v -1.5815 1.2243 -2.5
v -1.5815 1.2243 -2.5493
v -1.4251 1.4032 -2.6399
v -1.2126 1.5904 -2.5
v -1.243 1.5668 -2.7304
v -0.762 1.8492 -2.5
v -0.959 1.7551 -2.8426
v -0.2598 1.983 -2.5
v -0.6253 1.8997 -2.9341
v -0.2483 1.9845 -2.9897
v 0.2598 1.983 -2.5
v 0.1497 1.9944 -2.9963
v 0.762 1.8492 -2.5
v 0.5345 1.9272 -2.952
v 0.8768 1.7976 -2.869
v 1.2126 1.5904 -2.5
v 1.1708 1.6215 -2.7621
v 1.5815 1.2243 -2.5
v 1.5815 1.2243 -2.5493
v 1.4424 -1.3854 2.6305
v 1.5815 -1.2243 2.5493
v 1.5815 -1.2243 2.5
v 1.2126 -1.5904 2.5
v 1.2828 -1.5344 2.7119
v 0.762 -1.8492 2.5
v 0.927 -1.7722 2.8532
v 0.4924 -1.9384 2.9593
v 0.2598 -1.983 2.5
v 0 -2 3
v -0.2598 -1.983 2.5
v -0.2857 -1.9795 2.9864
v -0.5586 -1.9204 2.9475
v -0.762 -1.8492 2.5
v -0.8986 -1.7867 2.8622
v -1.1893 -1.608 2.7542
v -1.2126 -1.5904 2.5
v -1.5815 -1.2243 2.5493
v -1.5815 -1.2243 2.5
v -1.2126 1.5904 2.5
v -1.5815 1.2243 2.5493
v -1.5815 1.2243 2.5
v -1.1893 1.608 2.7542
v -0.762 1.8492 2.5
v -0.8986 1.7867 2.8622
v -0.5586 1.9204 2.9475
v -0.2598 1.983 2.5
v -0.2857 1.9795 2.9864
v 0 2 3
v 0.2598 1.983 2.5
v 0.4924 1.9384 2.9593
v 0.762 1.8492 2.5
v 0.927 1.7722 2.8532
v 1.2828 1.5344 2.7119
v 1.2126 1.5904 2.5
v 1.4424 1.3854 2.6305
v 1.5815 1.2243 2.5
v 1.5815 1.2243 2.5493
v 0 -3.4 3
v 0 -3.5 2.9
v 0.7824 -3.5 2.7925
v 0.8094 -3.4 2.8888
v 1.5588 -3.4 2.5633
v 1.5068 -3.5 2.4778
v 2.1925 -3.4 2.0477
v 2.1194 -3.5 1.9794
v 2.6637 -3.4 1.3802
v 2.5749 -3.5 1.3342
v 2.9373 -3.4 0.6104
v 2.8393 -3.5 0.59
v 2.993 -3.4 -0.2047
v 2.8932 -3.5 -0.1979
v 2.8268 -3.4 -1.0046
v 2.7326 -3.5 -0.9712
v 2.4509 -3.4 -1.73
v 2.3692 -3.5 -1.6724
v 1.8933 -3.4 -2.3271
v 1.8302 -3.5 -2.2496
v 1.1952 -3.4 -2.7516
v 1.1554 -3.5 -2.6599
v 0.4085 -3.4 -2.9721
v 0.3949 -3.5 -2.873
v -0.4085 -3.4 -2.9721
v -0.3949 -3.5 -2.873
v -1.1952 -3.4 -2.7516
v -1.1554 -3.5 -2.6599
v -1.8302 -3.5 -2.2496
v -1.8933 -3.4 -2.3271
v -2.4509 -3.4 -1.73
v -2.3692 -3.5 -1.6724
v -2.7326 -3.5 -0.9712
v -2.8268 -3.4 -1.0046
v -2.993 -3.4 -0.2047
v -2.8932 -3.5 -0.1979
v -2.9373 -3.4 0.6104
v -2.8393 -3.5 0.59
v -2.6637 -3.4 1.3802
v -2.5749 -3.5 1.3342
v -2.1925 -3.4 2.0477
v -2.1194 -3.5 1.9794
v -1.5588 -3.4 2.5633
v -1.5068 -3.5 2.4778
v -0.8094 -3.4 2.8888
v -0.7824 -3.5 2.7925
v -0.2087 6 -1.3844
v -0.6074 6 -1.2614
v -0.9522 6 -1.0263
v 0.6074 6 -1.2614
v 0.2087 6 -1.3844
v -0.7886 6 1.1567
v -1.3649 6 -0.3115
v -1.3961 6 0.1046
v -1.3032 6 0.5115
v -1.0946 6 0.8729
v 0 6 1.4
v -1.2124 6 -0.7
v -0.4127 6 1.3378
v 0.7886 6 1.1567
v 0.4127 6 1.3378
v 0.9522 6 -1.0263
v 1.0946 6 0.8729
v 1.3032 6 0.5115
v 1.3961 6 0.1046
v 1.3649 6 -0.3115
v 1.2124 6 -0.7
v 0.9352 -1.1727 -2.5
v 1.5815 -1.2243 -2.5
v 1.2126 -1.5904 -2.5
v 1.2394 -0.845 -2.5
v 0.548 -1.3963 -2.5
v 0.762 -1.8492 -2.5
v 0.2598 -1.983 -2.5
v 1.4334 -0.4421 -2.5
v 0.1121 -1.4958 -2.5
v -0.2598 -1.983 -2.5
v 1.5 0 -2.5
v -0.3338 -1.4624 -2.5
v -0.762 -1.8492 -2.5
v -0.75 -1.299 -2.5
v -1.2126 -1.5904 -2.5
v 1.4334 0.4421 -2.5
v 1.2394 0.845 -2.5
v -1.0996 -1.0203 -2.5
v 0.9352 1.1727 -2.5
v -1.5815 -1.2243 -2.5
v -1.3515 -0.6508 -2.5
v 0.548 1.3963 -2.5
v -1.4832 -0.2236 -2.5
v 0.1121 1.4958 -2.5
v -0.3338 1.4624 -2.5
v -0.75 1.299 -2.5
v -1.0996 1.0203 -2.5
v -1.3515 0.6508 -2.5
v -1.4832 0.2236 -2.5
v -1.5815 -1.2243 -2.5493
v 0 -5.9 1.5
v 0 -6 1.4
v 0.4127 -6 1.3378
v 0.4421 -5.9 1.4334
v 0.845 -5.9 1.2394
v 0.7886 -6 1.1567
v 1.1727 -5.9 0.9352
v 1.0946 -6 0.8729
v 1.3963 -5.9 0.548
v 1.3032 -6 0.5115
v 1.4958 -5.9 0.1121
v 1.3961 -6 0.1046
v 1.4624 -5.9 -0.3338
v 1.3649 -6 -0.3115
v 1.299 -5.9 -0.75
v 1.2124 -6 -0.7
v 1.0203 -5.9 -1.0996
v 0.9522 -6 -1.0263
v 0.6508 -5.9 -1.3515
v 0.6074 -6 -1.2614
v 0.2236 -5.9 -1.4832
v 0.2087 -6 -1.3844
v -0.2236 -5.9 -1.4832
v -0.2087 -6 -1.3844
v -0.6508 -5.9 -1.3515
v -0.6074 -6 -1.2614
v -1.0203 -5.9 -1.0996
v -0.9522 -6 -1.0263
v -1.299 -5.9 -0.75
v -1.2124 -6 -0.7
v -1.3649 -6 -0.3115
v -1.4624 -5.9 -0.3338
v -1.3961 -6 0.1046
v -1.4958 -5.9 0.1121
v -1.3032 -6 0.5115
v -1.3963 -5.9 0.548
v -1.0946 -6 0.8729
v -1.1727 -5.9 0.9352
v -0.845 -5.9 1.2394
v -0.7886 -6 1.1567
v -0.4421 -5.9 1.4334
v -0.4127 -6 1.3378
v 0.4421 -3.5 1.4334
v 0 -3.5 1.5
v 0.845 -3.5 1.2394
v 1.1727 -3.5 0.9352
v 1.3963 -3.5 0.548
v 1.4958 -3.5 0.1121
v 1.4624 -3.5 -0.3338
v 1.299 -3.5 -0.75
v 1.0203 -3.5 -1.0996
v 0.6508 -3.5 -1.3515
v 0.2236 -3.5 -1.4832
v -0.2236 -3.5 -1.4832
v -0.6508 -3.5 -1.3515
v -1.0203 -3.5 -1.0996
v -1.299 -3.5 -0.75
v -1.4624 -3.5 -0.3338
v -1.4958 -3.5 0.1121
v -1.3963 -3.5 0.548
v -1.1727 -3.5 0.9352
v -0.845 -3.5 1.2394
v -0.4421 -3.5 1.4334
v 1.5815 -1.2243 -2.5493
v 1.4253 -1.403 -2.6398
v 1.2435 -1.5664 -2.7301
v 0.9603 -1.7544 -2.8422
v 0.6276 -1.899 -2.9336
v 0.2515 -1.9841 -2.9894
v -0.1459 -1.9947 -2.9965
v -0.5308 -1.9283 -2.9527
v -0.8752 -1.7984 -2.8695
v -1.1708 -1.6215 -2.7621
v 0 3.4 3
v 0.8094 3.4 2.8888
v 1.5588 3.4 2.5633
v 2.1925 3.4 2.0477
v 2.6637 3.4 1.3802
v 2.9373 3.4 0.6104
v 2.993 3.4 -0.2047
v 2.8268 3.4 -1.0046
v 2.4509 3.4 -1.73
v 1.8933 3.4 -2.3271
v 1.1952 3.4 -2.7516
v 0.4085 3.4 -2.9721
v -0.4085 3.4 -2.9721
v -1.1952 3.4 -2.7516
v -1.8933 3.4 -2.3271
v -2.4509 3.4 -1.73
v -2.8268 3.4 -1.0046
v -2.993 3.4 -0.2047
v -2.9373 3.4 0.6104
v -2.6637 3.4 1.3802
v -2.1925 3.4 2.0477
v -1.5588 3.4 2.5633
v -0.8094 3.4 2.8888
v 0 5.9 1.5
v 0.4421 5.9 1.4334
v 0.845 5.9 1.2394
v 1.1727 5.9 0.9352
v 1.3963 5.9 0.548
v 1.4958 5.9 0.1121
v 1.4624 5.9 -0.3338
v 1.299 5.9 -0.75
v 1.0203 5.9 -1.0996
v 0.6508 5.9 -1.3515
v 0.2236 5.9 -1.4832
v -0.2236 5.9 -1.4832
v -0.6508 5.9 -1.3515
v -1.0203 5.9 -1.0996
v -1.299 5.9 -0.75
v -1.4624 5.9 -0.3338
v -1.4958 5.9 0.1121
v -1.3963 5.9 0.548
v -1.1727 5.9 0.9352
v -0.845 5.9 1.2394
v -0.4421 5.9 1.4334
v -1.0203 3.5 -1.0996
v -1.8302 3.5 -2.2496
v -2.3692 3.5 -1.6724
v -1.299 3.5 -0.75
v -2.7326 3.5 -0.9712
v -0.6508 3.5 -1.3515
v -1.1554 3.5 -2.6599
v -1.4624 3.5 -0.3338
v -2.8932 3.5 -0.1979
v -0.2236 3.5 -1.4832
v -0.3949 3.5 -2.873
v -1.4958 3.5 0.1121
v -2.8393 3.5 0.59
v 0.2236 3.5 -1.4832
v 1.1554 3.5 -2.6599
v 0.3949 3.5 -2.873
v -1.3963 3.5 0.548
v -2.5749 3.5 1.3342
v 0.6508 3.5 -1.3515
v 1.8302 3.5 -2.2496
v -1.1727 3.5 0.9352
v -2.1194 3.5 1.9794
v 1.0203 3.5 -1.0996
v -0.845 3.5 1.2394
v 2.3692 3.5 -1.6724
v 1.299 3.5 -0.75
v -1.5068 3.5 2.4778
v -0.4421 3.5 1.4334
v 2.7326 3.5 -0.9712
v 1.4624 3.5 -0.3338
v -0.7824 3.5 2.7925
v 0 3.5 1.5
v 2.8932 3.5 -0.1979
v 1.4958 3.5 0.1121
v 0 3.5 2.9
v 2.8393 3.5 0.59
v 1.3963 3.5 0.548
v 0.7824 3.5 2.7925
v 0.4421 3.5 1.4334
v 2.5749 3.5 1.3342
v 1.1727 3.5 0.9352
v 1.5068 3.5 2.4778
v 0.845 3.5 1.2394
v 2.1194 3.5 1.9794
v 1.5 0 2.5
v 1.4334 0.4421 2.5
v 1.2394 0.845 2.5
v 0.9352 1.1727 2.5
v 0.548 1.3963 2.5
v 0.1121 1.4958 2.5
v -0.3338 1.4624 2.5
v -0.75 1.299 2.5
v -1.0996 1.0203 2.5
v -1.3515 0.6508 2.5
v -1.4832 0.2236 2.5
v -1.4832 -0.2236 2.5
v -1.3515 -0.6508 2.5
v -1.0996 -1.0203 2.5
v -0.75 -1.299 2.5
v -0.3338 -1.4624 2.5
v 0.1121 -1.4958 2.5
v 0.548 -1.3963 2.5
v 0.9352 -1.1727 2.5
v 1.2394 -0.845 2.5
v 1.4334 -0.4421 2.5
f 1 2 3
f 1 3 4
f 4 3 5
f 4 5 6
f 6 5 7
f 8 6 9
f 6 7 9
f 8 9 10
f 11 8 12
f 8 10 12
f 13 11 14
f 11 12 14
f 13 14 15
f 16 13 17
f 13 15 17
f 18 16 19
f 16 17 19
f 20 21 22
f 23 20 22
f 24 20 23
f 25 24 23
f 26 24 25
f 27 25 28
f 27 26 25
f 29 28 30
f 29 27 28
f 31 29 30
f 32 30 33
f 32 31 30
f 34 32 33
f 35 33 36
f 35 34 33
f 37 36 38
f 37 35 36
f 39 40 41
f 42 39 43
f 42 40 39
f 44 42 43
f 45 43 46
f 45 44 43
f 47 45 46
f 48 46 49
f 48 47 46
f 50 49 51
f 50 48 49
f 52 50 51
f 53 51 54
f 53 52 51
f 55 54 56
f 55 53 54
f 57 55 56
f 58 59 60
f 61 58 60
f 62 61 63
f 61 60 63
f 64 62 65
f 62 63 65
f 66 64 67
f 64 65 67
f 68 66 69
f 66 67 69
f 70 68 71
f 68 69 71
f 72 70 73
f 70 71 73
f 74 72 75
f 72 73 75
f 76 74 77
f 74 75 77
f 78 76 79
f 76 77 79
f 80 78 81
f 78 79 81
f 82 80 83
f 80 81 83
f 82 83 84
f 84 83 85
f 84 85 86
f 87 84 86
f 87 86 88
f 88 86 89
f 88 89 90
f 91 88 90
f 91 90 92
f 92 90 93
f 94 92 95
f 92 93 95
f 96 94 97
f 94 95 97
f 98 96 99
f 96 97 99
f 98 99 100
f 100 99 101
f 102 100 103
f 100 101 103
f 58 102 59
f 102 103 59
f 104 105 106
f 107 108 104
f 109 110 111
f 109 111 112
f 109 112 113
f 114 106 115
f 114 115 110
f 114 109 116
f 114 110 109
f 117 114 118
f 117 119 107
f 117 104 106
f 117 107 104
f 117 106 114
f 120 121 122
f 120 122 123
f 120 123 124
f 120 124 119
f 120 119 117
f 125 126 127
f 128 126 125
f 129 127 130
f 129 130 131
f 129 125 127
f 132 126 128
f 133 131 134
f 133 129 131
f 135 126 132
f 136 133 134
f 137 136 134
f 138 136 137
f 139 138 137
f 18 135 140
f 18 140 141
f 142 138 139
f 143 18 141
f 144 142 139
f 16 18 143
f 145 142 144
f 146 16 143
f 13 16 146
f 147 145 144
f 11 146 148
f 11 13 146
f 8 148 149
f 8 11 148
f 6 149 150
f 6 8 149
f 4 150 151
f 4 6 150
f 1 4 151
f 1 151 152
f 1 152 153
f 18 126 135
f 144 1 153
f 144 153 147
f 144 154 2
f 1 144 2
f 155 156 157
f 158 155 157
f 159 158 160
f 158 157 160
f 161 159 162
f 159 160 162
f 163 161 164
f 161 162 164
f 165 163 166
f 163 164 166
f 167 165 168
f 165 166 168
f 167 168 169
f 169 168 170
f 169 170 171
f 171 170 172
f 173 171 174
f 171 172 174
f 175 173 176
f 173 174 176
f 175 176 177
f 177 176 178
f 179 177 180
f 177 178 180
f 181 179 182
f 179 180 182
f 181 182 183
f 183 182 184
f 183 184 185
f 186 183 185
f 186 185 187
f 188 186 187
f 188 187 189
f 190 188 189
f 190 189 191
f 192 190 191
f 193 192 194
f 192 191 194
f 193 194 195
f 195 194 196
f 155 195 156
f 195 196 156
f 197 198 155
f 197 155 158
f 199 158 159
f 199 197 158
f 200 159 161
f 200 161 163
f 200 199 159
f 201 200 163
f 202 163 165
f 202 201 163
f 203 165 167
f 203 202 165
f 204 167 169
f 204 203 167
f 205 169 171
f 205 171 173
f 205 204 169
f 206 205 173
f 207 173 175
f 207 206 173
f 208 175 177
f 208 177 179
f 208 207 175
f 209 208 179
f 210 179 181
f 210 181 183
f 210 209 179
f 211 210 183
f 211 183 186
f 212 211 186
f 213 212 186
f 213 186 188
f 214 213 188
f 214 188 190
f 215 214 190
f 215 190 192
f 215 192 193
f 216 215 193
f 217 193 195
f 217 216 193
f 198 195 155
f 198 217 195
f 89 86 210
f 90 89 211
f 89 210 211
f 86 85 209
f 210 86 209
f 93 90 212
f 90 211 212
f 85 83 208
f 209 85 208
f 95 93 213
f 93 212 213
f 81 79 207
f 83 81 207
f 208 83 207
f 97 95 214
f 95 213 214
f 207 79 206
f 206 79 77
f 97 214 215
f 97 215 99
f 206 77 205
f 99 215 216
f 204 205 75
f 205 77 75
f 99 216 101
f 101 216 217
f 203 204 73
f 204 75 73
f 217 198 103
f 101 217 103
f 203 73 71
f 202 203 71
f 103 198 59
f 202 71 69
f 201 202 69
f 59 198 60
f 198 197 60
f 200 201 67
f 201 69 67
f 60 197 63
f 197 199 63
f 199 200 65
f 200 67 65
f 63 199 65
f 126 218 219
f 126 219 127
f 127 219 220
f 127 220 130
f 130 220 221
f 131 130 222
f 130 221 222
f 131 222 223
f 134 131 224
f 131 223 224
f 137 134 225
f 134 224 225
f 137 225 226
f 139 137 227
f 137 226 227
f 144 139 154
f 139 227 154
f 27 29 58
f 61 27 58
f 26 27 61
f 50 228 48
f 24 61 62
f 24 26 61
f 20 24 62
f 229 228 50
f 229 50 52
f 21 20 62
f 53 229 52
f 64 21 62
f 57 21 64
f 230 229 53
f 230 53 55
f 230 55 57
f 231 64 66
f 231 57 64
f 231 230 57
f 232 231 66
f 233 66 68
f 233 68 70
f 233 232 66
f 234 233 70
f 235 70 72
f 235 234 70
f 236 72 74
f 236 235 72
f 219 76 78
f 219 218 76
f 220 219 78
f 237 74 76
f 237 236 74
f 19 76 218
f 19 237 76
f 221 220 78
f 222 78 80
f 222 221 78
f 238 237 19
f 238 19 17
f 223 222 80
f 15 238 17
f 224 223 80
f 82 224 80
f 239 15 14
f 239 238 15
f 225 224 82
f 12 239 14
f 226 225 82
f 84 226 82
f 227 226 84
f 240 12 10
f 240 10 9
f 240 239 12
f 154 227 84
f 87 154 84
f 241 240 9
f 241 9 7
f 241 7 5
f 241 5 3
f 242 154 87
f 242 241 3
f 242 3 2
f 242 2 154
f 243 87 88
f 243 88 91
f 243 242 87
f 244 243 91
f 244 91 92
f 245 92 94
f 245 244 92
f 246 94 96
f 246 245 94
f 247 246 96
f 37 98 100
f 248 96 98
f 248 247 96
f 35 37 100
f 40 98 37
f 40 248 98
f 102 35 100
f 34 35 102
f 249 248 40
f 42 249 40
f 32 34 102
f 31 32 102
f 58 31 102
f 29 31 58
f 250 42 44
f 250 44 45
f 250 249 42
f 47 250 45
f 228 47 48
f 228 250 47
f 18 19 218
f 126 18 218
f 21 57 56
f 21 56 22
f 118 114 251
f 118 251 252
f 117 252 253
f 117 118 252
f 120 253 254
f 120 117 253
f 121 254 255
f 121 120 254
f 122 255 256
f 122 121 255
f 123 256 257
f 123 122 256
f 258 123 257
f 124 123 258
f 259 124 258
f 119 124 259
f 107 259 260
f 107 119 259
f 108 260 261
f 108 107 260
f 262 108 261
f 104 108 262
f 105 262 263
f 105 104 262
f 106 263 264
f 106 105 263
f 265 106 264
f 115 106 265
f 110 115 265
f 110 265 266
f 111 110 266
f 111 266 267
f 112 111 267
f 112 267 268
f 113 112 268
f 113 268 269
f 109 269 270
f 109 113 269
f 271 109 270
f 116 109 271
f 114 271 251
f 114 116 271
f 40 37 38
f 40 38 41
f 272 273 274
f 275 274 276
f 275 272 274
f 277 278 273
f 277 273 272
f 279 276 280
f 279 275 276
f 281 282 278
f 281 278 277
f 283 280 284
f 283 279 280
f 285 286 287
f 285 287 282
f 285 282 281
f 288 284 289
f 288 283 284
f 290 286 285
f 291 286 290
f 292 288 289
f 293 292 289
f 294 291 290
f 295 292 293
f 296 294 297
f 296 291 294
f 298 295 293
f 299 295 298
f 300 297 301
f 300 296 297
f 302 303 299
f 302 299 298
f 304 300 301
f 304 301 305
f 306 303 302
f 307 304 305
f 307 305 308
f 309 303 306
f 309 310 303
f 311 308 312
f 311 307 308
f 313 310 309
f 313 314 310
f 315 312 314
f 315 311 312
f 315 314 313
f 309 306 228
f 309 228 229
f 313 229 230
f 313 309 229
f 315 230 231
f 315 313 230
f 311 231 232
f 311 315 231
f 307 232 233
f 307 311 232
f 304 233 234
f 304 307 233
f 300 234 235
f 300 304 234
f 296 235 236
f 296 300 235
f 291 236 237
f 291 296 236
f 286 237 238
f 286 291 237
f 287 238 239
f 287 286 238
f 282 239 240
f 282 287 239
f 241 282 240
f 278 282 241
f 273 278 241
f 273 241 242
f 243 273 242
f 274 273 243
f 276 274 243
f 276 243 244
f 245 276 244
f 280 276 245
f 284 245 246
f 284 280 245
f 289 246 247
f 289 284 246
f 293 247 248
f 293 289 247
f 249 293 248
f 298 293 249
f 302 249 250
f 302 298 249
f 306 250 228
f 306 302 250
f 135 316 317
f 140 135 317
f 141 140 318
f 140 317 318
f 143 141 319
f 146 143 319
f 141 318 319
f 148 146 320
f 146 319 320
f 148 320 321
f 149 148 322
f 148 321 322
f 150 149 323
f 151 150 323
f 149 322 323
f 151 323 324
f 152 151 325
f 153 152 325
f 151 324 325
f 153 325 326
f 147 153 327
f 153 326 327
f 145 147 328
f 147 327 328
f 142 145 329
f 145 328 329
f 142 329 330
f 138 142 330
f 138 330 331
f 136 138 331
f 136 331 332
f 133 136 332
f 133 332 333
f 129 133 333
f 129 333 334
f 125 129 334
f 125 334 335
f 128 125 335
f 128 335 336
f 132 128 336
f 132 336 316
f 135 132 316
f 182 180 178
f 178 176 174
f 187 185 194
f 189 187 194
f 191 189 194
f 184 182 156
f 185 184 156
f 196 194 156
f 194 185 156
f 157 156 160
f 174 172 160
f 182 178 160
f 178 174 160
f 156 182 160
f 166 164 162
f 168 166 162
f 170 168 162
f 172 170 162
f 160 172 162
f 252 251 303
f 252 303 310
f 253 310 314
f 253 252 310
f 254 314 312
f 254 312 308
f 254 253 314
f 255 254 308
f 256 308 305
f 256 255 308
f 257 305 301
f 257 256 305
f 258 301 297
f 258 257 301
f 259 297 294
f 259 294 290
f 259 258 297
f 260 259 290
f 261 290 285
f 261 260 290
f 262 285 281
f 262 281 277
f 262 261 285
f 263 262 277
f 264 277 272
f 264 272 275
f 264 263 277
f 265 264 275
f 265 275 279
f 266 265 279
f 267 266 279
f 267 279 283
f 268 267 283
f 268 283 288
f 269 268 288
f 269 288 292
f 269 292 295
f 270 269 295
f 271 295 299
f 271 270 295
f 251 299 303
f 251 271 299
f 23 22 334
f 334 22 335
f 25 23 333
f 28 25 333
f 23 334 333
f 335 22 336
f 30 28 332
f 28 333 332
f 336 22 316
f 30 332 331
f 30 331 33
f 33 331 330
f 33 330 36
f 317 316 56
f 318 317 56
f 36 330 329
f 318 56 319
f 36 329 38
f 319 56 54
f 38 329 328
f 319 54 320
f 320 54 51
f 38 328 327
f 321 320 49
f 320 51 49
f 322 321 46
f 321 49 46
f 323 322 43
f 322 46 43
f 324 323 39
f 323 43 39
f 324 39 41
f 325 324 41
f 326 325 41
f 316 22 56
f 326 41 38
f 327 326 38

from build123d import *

# Parameters (mm, degrees)
SKETCH1_R           = 1.5
BOSS_EXTRUDE1_DEPTH = 6
SKETCH2_R           = 3
BOSS_EXTRUDE2_DEPTH = 3.5
CUT_EXTRUDE1_DEPTH  = 0.5
SKETCH3_3_R         = 1.5
CUT_EXTRUDE2_DEPTH  = 10.0000001
CHAMFER1_SIZE       = 0.1


with BuildPart() as part:
    # Sketch1 → Boss-Extrude1 (new, symmetric)
    with BuildSketch(Plane(origin=(0, 0, 0), x_dir=(1, 0, 0), z_dir=(0, 1, 0))):
        Circle(SKETCH1_R)
    extrude(amount=BOSS_EXTRUDE1_DEPTH, both=True)

    # Sketch2 → Boss-Extrude2 (add, symmetric)
    with BuildSketch(Plane(origin=(0, 0, 0), x_dir=(1, 0, 0), z_dir=(0, 1, 0))):
        Circle(SKETCH2_R)
    extrude(amount=BOSS_EXTRUDE2_DEPTH, both=True)

    # Sketch3 → Cut-Extrude1 (cut)
    with BuildSketch(Plane.XY.offset(3)):
        with BuildLine():
            Line((1.581457004, 1.224334), (1.581457004, -1.224334))
            ThreePointArc((1.581457004, -1.224334), (0, -2), (-1.581457004, -1.224334))
            Line((-1.581457004, -1.224334), (-1.581457004, 1.224334))
            ThreePointArc((-1.581457004, 1.224334), (0, 2), (1.581457004, 1.224334))
        make_face()
    cut_extrude1 = extrude(amount=-CUT_EXTRUDE1_DEPTH, mode=Mode.SUBTRACT)

    # Sketch3<3> → Cut-Extrude2 (cut, through all)
    with BuildSketch(Plane.XY.offset(3)):
        Circle(SKETCH3_3_R)
    extrude(amount=-CUT_EXTRUDE2_DEPTH, mode=Mode.SUBTRACT)

    # Mirror1: Cut-Extrude1 across plane
    add(cut_extrude1.mirror(Plane.XY), mode=Mode.SUBTRACT)

    # Chamfer1
    chamfer1_edges = [part.edges().sort_by_distance(p)[0] for p in [
        (-1.5, 6, 0),
        (-1.5, -6, 0),
        (-3, -3.5, 0),
        (-3, 3.5, 0),
    ]]
    chamfer(chamfer1_edges, length=CHAMFER1_SIZE)


solid = part.part
